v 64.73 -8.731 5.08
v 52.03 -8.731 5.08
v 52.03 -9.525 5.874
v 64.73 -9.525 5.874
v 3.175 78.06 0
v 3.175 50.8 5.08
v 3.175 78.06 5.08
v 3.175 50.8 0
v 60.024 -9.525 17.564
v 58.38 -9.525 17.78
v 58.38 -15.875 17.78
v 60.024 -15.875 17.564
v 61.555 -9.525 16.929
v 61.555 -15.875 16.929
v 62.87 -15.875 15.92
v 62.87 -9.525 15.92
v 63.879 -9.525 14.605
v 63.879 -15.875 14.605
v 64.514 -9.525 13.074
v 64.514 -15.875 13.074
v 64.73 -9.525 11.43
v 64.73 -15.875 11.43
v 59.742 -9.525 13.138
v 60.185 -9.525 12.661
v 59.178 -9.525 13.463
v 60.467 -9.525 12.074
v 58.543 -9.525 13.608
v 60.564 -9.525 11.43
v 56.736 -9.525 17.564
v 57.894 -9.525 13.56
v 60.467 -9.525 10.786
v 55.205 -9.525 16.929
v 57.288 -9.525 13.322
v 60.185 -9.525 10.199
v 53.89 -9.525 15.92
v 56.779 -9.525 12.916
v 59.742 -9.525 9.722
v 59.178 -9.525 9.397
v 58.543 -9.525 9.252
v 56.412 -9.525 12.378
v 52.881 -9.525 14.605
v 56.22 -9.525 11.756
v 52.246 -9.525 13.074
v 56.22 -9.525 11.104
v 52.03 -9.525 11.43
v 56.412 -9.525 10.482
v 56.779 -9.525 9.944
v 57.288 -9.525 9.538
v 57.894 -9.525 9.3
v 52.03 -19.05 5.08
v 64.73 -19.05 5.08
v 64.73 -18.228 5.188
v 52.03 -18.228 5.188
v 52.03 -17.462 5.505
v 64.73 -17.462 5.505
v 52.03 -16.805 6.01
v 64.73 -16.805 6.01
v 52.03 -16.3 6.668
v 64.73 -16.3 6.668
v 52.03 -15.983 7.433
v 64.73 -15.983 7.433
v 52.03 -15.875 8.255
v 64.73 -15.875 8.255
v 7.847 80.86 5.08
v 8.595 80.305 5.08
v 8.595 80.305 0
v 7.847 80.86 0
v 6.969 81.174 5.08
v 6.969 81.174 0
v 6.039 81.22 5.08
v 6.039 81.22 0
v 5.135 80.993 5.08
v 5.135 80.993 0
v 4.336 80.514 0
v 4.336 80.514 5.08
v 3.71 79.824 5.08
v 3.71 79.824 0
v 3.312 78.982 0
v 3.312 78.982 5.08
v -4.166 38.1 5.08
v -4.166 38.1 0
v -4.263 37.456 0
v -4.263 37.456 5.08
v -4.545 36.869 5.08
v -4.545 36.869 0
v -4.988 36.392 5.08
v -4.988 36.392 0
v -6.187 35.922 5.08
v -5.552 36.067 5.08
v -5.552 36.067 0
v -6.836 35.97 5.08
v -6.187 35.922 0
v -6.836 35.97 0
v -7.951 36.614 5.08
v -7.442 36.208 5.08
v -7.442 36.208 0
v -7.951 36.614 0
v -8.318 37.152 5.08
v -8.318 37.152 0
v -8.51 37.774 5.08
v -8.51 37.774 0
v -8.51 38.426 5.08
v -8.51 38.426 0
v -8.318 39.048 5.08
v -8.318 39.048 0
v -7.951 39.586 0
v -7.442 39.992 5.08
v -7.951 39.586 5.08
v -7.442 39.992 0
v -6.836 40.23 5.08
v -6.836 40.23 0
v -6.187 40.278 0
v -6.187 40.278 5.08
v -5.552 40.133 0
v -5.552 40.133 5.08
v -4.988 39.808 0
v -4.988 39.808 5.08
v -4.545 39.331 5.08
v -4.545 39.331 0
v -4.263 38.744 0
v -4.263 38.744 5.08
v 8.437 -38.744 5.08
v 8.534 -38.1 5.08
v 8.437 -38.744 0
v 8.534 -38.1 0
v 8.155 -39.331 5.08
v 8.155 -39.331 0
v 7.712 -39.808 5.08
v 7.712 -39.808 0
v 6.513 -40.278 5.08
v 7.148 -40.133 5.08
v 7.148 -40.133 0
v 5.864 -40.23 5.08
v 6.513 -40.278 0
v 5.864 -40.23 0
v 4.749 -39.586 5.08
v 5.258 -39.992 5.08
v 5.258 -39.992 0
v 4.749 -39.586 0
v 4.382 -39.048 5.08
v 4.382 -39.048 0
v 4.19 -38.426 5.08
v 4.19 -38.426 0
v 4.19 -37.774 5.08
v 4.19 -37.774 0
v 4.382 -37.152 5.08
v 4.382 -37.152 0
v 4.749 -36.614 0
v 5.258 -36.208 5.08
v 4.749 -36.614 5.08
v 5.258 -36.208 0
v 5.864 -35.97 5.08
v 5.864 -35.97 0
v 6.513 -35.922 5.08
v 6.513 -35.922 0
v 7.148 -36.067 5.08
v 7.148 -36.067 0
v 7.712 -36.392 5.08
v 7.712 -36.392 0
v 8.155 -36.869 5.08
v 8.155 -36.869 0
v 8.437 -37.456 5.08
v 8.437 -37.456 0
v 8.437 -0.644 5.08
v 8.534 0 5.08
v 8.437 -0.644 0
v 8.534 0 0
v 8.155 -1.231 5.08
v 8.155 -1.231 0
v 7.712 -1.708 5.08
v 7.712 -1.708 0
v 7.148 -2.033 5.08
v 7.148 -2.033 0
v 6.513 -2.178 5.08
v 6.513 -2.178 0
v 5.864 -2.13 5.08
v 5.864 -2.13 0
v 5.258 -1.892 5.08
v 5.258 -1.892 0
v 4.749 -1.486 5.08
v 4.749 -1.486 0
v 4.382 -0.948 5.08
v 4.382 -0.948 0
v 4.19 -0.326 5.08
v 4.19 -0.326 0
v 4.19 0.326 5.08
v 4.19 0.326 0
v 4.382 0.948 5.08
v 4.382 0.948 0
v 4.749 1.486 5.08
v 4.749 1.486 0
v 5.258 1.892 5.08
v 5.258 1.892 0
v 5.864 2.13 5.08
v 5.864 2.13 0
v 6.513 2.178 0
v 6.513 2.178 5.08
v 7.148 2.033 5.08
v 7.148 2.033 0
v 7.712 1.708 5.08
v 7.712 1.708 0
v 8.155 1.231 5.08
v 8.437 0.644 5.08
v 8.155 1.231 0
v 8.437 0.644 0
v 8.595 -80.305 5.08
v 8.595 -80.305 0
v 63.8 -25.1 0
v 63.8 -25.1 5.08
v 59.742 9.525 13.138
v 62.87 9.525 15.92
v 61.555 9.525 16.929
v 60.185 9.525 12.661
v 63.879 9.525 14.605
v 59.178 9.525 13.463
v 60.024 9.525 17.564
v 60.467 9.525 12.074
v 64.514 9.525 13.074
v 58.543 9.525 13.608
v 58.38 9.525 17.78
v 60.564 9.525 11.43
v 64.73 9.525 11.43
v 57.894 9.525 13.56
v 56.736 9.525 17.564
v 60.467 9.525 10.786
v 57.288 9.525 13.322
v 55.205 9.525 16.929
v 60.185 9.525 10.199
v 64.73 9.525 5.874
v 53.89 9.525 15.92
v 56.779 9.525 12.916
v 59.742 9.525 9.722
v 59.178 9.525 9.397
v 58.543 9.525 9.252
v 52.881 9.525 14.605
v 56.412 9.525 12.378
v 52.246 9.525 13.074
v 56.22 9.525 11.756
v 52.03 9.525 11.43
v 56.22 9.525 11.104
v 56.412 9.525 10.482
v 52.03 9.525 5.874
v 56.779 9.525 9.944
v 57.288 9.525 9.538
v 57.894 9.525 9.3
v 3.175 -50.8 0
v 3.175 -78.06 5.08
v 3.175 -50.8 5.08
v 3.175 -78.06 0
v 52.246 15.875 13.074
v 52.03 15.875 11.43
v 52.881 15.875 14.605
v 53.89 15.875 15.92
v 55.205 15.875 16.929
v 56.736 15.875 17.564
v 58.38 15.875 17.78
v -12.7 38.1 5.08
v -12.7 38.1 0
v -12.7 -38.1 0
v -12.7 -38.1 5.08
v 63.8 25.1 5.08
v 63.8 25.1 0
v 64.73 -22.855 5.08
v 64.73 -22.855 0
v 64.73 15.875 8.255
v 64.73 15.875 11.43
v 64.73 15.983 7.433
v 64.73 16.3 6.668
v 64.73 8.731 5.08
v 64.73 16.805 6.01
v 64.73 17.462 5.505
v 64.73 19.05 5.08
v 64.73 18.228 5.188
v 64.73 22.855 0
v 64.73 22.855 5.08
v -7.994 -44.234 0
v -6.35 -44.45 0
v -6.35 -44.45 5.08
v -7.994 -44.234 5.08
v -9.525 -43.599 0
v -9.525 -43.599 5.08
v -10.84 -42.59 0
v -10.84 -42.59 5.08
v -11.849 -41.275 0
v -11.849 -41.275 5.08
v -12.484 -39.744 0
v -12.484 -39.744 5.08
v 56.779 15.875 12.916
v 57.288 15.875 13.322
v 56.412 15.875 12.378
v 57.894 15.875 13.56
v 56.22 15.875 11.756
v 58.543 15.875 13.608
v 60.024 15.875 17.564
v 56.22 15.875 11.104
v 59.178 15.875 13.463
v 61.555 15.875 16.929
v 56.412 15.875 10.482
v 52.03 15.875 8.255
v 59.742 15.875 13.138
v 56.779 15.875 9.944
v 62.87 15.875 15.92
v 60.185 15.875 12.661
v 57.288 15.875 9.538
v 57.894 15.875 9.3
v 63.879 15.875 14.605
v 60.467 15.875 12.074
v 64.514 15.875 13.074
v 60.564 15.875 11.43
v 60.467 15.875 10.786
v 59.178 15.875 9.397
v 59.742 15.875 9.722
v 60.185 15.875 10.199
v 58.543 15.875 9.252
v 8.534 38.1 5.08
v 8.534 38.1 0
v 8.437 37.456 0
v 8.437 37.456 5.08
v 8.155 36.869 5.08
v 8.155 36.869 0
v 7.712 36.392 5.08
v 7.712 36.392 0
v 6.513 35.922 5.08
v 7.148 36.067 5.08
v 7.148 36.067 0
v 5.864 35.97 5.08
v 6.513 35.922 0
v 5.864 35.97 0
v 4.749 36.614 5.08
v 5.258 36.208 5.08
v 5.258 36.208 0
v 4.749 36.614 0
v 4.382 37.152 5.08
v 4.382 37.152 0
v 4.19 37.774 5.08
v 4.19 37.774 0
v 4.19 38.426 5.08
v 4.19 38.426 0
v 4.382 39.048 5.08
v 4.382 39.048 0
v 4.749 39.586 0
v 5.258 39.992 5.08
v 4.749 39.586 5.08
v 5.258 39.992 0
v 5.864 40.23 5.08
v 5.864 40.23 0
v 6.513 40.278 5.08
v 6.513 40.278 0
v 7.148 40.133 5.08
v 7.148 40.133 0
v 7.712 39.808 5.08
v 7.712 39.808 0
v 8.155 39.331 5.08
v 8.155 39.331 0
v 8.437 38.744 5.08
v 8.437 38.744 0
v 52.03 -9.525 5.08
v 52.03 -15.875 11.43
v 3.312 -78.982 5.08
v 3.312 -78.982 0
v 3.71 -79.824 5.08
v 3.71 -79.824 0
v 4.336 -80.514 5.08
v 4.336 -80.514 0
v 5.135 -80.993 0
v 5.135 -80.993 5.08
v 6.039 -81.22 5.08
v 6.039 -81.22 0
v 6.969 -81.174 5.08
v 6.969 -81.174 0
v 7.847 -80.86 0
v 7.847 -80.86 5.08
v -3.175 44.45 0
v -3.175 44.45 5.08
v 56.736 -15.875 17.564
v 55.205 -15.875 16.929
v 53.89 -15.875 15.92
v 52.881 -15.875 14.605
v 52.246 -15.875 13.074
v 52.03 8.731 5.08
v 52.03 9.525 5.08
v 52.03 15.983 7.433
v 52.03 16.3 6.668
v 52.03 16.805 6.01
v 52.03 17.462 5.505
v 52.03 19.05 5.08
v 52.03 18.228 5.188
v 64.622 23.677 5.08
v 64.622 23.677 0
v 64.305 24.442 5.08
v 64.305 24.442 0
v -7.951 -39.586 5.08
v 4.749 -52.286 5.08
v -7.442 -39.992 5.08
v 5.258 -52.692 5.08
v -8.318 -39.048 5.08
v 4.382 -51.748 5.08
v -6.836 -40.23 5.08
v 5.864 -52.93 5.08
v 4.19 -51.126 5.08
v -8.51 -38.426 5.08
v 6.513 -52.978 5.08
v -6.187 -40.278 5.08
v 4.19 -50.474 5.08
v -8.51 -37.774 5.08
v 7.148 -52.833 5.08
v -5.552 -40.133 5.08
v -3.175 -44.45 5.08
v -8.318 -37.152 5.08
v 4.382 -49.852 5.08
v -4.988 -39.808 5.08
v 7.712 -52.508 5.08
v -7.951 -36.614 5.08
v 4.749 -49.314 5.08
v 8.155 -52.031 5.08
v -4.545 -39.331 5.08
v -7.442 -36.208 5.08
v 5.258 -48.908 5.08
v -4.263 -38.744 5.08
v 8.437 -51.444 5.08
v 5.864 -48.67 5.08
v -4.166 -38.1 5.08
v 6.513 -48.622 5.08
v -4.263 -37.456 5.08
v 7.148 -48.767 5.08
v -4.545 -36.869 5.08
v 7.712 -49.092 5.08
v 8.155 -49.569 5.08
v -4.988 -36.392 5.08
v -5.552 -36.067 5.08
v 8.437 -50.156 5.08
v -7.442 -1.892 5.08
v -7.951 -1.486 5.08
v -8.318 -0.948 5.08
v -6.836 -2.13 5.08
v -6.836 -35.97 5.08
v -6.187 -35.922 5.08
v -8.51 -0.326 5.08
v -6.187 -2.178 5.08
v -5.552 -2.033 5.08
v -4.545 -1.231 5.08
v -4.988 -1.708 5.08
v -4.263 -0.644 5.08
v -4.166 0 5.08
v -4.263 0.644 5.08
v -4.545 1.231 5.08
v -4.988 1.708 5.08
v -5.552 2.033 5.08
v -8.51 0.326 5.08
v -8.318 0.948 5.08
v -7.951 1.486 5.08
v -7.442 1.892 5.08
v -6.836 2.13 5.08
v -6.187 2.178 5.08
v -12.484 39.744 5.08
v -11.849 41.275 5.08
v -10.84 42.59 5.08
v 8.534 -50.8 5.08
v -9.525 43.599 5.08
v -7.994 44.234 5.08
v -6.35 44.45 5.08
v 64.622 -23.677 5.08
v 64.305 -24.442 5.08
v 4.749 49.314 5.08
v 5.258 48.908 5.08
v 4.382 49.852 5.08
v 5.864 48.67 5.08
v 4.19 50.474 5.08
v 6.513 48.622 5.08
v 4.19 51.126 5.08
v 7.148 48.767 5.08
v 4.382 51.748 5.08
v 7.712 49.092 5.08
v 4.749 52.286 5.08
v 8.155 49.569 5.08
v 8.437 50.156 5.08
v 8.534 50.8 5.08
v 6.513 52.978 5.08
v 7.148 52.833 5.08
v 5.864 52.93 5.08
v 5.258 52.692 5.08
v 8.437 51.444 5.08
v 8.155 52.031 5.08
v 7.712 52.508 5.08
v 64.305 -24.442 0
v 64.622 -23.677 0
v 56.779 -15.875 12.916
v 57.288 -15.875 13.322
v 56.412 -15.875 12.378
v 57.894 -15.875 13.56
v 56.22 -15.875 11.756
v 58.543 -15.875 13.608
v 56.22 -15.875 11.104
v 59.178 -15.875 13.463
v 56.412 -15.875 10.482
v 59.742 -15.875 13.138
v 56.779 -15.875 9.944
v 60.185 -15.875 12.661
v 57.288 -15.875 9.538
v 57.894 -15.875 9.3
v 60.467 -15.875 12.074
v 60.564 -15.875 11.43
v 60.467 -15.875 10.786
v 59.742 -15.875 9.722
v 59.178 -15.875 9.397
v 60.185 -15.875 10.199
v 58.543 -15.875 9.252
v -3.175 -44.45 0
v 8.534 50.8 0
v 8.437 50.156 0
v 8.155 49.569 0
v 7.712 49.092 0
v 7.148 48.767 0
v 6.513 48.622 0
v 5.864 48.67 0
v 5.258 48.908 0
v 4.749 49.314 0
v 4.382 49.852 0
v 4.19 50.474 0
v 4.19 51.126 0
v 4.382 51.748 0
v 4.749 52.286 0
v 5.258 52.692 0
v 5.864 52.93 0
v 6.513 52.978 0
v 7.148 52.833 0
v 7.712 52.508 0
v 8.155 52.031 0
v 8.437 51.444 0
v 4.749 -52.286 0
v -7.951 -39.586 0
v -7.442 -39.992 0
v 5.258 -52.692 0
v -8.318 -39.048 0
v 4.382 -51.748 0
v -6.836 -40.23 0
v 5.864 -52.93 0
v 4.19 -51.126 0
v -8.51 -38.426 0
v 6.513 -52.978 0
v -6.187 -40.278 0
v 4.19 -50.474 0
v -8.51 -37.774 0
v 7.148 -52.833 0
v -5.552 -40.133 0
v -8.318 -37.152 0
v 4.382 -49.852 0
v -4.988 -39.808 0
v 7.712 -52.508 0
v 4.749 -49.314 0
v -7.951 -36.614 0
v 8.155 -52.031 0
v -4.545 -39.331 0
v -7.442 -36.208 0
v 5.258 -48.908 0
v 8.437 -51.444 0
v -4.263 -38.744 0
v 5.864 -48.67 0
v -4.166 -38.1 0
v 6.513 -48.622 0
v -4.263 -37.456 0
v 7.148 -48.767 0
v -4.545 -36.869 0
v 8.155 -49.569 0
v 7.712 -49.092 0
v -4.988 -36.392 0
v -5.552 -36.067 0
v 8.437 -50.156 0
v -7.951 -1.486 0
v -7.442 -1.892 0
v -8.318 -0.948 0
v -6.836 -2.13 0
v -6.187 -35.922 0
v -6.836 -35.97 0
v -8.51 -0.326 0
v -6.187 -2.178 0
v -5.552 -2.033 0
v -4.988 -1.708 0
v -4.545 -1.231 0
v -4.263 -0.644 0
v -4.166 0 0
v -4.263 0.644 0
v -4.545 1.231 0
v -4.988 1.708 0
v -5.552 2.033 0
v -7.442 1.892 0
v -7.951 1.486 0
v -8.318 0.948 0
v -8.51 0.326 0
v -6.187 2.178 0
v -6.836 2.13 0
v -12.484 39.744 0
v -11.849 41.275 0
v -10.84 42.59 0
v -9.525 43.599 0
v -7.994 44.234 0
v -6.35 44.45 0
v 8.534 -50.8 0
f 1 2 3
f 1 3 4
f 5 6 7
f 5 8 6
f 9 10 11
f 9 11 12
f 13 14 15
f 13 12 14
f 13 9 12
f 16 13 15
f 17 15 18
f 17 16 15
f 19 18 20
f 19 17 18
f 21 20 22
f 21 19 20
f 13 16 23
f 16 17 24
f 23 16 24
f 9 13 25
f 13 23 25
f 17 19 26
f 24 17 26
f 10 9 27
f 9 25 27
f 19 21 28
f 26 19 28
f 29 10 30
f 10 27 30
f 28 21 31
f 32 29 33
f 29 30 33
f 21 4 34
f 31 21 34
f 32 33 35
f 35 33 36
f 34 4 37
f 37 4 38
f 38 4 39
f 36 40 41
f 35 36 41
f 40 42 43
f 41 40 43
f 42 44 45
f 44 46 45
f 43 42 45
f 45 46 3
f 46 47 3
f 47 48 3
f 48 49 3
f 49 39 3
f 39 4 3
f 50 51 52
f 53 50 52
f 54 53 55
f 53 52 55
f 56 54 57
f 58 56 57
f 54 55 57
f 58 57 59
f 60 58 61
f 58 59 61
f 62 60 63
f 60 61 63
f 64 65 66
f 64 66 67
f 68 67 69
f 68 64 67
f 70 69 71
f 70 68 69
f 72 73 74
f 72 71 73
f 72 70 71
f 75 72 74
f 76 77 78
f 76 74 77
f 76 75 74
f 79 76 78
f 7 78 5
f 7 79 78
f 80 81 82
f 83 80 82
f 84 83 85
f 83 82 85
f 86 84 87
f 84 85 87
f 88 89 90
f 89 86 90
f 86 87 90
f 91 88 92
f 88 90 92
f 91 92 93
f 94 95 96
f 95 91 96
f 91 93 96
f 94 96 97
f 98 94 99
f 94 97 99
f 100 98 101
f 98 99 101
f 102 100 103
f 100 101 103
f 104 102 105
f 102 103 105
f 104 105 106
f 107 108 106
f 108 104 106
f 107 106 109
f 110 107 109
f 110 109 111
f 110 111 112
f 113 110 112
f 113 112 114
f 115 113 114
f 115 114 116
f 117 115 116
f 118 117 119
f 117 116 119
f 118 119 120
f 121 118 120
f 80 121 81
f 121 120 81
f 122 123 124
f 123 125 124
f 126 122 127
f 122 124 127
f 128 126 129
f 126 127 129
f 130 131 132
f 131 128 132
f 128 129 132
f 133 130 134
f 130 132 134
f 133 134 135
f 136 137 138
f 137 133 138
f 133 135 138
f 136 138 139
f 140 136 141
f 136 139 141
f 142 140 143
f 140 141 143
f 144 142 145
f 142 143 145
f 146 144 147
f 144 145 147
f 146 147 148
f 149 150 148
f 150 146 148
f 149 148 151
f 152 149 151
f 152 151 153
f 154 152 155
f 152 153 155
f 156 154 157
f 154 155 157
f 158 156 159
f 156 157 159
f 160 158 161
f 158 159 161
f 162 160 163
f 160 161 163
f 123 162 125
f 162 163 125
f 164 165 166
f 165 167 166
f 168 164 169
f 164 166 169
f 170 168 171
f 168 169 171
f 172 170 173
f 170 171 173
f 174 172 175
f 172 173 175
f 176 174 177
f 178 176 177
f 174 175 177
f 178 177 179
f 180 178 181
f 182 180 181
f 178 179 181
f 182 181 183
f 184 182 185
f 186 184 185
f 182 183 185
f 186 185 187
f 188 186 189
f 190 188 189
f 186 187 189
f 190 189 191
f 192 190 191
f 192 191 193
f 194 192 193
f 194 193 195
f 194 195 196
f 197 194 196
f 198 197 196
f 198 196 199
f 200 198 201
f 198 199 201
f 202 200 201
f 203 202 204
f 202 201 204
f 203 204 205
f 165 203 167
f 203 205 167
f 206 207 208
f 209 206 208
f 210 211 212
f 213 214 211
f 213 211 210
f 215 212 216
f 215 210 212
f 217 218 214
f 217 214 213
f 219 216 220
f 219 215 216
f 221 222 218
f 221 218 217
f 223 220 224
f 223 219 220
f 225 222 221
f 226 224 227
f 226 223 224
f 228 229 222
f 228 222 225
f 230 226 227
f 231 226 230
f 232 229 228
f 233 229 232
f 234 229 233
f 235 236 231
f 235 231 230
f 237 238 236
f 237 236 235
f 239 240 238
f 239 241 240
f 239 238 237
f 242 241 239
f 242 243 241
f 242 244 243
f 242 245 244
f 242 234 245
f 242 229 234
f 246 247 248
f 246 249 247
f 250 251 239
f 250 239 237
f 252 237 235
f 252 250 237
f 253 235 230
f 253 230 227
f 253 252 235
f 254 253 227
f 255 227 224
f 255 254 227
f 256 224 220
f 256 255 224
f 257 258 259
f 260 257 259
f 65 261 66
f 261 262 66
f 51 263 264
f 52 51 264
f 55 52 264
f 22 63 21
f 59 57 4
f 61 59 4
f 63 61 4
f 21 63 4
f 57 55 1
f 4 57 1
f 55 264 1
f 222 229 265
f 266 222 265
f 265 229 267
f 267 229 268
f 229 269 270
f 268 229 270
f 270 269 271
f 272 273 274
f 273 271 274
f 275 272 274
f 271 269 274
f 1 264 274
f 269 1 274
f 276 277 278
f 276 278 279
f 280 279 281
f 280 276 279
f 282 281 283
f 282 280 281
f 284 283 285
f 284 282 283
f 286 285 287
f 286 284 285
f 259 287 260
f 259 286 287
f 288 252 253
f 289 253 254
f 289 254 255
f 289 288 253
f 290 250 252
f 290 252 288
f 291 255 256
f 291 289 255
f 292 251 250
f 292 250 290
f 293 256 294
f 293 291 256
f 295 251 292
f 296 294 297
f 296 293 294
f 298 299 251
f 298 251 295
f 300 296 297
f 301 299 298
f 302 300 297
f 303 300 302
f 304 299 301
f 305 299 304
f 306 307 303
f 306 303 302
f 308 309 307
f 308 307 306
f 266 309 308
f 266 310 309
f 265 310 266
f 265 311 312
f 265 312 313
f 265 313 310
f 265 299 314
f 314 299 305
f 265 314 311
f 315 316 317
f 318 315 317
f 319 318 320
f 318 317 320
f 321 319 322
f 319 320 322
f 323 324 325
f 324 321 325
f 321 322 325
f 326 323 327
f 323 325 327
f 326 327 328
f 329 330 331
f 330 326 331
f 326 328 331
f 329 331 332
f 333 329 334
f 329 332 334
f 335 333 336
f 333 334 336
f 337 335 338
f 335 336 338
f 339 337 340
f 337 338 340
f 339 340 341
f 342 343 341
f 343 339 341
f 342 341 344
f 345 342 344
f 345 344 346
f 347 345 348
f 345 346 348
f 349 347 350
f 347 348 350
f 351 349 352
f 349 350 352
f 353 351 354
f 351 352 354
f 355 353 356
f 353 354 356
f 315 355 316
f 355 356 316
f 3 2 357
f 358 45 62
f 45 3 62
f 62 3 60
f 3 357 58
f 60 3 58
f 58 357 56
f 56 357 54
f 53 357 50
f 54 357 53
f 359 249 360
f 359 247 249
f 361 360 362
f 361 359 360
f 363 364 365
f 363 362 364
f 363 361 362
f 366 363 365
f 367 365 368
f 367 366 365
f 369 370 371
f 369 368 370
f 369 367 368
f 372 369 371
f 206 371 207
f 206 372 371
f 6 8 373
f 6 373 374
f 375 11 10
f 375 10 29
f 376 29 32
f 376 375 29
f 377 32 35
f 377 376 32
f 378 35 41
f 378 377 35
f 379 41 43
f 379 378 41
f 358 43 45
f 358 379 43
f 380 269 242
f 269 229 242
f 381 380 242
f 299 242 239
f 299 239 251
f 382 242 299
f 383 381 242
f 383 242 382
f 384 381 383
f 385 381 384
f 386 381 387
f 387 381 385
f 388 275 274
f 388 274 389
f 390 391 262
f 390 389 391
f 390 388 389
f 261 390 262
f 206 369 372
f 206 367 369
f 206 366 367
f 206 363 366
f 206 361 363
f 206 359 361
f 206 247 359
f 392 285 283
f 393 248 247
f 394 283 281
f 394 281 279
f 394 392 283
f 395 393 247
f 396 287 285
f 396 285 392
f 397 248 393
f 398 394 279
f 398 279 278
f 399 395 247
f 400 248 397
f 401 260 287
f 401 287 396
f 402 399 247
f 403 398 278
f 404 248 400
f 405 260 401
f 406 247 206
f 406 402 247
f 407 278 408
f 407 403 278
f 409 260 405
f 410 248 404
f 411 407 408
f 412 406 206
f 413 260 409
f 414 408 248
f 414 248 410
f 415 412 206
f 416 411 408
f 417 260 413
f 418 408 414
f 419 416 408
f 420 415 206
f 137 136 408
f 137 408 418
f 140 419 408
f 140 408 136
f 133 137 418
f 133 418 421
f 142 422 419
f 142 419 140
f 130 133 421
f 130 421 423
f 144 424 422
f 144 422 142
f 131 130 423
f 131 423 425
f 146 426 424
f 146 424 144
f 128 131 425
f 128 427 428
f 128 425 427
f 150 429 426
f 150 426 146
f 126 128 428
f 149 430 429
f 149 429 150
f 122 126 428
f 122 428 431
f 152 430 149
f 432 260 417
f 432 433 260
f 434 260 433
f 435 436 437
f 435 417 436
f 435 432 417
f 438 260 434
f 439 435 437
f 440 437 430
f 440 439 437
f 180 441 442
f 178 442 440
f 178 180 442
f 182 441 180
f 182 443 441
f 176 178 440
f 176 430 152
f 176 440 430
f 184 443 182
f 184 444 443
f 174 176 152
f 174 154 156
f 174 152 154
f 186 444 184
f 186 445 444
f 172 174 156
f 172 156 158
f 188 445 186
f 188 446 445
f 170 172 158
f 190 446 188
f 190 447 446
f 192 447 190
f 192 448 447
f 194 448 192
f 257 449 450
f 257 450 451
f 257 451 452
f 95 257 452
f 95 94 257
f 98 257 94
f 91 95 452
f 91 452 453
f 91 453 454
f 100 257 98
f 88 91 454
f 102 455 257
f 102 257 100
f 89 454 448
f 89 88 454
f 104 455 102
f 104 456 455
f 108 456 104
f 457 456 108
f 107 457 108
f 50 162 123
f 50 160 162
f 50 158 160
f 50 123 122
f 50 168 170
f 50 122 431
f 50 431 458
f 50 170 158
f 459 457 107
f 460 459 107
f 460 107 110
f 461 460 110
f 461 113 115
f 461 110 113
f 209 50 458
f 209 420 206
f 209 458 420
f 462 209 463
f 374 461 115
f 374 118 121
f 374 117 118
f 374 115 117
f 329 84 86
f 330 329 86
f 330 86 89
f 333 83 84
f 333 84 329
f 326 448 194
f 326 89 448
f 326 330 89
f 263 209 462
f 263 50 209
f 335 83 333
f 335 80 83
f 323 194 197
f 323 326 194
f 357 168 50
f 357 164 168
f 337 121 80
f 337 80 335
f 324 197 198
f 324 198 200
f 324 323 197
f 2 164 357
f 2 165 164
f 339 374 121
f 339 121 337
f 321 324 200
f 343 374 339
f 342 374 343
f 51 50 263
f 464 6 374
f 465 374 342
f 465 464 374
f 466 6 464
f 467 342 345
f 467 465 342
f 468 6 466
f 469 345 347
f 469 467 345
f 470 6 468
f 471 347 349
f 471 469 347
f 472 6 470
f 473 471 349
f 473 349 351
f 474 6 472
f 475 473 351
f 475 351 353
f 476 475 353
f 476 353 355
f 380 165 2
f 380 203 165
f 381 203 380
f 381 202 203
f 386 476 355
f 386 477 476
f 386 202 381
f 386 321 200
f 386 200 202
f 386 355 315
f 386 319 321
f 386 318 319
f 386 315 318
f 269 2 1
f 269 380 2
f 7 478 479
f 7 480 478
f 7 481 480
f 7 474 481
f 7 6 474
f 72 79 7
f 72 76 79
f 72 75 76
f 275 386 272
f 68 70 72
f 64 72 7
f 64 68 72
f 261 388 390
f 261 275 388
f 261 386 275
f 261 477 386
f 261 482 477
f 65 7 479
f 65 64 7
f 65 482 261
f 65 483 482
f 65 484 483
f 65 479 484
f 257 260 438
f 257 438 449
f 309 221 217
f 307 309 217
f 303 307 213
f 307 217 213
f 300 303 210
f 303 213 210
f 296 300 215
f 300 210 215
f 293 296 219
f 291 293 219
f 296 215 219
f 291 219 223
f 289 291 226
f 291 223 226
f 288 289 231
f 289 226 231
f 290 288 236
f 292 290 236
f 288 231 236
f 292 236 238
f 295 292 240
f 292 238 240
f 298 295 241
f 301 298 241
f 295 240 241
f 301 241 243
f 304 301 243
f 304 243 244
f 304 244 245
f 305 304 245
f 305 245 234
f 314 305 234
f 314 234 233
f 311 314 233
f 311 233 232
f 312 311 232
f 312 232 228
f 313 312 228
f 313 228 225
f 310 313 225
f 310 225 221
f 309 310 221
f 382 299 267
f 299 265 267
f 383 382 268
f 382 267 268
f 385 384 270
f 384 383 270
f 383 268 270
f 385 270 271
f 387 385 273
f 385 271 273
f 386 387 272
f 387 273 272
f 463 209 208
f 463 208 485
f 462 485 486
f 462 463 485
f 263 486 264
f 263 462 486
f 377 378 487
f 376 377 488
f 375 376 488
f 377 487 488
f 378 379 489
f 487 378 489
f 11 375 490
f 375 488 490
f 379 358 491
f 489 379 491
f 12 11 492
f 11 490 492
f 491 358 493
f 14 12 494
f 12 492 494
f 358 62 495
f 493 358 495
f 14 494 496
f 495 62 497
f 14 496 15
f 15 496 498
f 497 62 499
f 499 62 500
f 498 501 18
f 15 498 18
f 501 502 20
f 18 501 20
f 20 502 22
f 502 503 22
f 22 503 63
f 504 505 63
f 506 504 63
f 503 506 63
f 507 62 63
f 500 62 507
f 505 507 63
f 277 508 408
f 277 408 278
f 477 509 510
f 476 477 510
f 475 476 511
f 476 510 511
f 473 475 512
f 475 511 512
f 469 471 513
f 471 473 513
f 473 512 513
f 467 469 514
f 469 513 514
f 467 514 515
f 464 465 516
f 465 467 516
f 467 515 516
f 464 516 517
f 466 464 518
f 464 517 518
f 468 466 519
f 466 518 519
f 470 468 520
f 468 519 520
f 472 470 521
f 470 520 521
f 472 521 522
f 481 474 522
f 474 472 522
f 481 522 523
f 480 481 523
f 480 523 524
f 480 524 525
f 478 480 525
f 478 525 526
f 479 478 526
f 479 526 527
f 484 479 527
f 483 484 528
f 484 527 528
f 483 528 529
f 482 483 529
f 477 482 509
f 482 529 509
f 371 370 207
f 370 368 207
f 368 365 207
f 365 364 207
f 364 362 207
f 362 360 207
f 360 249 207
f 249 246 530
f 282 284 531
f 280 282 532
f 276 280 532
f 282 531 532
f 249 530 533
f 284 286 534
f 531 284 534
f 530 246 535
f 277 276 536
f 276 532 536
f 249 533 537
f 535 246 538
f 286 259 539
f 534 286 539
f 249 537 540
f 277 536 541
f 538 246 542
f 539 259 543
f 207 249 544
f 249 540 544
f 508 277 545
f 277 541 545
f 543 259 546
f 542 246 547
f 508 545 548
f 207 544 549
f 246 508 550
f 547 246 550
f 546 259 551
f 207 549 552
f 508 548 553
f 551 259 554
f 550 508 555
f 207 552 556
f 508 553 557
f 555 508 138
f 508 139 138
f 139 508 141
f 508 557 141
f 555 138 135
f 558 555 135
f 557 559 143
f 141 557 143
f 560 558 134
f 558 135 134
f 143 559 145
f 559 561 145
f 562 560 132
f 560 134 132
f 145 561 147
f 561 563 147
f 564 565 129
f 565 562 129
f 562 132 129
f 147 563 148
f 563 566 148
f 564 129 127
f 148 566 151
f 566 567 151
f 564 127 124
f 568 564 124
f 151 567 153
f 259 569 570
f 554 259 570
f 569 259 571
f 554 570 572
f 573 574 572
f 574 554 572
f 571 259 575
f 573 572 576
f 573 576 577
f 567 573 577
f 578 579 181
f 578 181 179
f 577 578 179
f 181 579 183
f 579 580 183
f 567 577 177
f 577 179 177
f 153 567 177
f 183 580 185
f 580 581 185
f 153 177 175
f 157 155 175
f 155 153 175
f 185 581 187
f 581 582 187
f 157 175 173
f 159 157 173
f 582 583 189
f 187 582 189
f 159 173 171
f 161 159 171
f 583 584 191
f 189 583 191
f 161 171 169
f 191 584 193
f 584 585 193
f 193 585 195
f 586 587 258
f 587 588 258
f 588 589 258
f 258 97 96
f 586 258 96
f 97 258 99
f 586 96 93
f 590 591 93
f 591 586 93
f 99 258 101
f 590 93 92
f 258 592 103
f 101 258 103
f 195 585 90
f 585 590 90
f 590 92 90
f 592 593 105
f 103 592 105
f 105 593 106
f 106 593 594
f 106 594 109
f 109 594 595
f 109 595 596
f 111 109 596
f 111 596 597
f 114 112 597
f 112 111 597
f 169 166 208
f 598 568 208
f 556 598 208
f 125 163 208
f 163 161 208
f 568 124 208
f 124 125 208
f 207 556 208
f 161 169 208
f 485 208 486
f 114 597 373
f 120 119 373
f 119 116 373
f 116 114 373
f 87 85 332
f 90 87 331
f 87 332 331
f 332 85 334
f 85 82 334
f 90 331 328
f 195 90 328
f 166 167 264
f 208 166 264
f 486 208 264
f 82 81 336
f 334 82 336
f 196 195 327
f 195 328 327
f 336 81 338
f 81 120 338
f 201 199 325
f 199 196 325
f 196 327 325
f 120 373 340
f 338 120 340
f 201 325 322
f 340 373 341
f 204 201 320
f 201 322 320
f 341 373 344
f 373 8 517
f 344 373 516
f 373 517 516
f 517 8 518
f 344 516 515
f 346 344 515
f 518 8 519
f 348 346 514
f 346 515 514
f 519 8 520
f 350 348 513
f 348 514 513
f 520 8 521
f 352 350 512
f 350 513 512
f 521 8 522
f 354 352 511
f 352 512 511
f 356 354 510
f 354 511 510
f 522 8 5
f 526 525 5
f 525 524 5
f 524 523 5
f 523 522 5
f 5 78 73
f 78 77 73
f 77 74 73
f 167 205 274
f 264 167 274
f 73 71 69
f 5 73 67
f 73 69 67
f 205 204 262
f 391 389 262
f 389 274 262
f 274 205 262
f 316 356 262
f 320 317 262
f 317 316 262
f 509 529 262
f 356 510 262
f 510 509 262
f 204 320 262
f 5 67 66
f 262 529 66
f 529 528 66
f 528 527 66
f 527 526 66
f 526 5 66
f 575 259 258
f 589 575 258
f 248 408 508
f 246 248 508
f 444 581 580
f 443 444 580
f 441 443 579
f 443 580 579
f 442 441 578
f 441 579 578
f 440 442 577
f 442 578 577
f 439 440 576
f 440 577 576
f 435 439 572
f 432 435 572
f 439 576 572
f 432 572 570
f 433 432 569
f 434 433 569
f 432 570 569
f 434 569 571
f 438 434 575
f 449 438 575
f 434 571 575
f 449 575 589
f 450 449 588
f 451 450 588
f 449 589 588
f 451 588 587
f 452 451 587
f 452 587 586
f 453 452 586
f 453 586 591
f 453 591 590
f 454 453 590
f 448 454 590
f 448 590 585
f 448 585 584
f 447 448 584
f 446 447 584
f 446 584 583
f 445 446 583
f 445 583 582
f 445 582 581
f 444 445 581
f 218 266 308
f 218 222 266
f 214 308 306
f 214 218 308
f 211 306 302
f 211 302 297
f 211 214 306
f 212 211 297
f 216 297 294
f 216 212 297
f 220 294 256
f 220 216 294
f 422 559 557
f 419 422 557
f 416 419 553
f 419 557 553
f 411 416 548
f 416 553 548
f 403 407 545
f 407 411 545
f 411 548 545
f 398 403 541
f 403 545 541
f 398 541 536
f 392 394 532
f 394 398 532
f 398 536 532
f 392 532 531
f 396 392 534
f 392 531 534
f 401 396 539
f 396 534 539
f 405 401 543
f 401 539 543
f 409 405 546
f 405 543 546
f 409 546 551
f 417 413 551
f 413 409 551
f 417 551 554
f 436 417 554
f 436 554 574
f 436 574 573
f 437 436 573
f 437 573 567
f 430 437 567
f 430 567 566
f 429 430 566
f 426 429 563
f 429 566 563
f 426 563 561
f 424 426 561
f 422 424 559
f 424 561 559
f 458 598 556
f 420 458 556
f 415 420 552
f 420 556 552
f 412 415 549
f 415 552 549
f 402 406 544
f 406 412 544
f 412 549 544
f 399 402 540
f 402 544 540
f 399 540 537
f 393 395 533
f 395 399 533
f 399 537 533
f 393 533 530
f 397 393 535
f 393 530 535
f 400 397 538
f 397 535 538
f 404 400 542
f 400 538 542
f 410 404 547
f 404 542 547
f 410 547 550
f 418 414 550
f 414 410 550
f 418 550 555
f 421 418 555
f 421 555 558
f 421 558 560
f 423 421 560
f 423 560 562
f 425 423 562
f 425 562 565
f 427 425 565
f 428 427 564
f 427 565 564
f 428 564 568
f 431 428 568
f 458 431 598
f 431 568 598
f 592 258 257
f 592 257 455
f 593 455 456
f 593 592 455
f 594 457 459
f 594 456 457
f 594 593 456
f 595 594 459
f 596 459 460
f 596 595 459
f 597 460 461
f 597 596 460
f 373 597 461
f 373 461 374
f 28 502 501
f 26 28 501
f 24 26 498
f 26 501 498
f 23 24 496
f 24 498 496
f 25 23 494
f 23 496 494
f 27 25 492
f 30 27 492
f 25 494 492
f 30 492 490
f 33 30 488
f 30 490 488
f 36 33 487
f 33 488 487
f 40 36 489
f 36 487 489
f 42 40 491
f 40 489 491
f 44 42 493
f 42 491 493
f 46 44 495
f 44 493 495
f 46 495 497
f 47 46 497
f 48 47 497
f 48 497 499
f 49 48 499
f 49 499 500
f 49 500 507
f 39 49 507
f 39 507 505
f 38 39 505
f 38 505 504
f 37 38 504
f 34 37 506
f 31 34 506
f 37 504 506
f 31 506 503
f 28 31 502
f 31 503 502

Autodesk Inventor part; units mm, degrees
ref_plane "YZ Plane" through (0, 0, 0) normal (1, 0, 0) x (0, 1, 0)
ref_plane "XZ Plane" through (0, 0, 0) normal (0, 1, 0) x (-1, 0, 0)
ref_plane "XY Plane" through (0, 0, 0) normal (0, 0, 1) x (1, 0, 0)
sketch "Sketch1" plane through (0, 0, 0) normal (0, 0, 1) x (1, 0, 0)
  line L0 (88.9, 0) -> (-12.7, 101.6)
  line L1 (-12.7, 101.6) -> (-12.7, -101.6)
  line L2 (-12.7, -101.6) -> (88.9, 0)
  line L3 (-12.7, 0) -> (88.9, 0)
  line L4 (64.73, 183.898) -> (-316.27, 183.898)
  line L5 (-316.27, 183.898) -> (-316.27, -183.898)
  line L6 (-316.27, -183.898) -> (64.73, -183.898)
  line L7 (64.73, -183.898) -> (64.73, 183.898)
  line L8 (64.73, 183.898) -> (-316.27, -183.898) construction
  line L9 (-316.27, 183.898) -> (64.73, -183.898) construction
  circle A0 centre (6.35, 38.1) radius 2.1844 projected
  circle A1 centre (-6.35, 38.1) radius 2.1844 projected
  circle A2 centre (-6.35, -38.1) radius 2.1844 projected
  circle A3 centre (6.35, -38.1) radius 2.1844 projected
  circle A4 centre (6.35, 0) radius 2.1844 projected
  circle A5 centre (6.35, 88.9) radius 2.1844 projected
  circle A6 centre (6.35, 50.8) radius 2.1844 projected
  circle A7 centre (6.35, -50.8) radius 2.1844 projected
  circle A8 centre (-6.35, 0) radius 2.1844 projected
  circle A9 centre (-6.35, 38.1) radius 6.35
  circle A10 centre (-6.35, -38.1) radius 6.35
  line L10 (3.175, -85.725) -> (3.175, -44.45)
  line L11 (3.175, -44.45) -> (-11.204, -44.45)
  line L12 (-10.742, 44.45) -> (3.175, 44.45)
  line L13 (3.175, 44.45) -> (3.175, 85.725)
  point P0 (0, 0)
  point P1 (-125.77, 0)
  point P2 (64.73, 24.17)
  point P3 (-6.35, 44.45)
  point P4 (-12.7, 38.1)
  point P5 (-12.7, -38.1)
  point P6 (-6.35, -44.45)
  point P7 (64.73, -24.17)
  dimension "d0" = 101.6
  dimension "d2" = 381
  dimension "d4" = 12.7
  dimension "d5" = 12.7
  dimension "d6" = 3.175
  dimension "d7" = 3.175
extrude "Extrusion1" add sketch "Sketch1" along normal blind 5.08 contours L0 L7 L3 A4 A8 L1 A9 L12 L13 | A9 | L7 L2 L10 L11 A10 L1 L3 A8 A4 | A10
chamfer "Chamfer1" distance 6.35 angle 45 2 edges at (3.175, 44.45, 2.54) (3.175, -44.45, 2.54)
fillet "Fillet1" radius 3.175 4 edges at (3.175, 85.725, 2.54) (3.175, -85.725, 2.54) (64.73, 24.17, 2.54) (64.73, -24.17, 2.54)
sketch "Sketch2" plane through (0, 0, 5.08) normal (0, 0, 1) x (1, 0, 0)
  circle A0 centre (58.38, 0) radius 2.1844
  line L0 (58.38, 0) -> (0, 0) construction
  circle A1 centre (58.38, 12.7) radius 2.1844
  circle A2 centre (58.38, -12.7) radius 2.1844
  line L1 (58.38, 0) -> (58.38, -12.7) construction
  line L2 (64.73, -22.8548) -> (64.73, 22.8548) construction
  line L3 (52.03, -15.875) -> (64.73, -15.875)
  line L4 (64.73, -15.875) -> (64.73, -9.525)
  line L5 (64.73, -9.525) -> (52.03, -9.525)
  line L6 (52.03, -9.525) -> (52.03, -15.875)
  line L7 (52.03, -15.875) -> (64.73, -9.525) construction
  line L8 (64.73, -15.875) -> (52.03, -9.525) construction
  line L9 (52.03, 15.875) -> (64.73, 15.875)
  line L10 (64.73, 15.875) -> (64.73, 9.525)
  line L11 (64.73, 9.525) -> (52.03, 9.525)
  line L12 (52.03, 9.525) -> (52.03, 15.875)
  line L13 (52.03, 15.875) -> (64.73, 9.525) construction
  line L14 (64.73, 15.875) -> (52.03, 9.525) construction
  dimension "d14" = 4.3688
  dimension "d15" = 12.7
  dimension "d16" = 6.35
  dimension "d17" = 12.7
  dimension "d18" = 6.35
  dimension "d19" = 12.7
  dimension "d20" = 6.35
extrude "Extrusion2" add sketch "Sketch2" along normal blind 12.7 contours A1 | A2 | L6 L5 L4 L3 | L9 L10 L11 L12
fillet "Fillet2" radius 3.175 2 edges at (58.38, -15.875, 5.08) (58.38, 15.875, 5.08)
fillet "Fillet3" radius 6.35 4 edges at (64.73, -12.7, 17.78) (64.73, 12.7, 17.78) (52.03, 12.7, 17.78) (52.03, -12.7, 17.78)
sketch "Sketch3" plane through (52.03, -15.875, 8.255) normal (0, -1, 0) x (1, 0, 0)
  arc A0 (12.7, 3.175) -> (0, 3.175) centre (6.35, 3.175) ccw projected
  circle A1 centre (6.35, 3.175) radius 2.1844
  point P0 (-52.03, -8.255)
  dimension "d28" = 4.3688
extrude "Extrusion3" cut sketch "Sketch3" against normal through all
chamfer "Chamfer3" distance 0.7937 angle 45 2 edges at (58.38, -9.525, 5.08) (58.38, 9.525, 5.08)
properties part number "wedge"
